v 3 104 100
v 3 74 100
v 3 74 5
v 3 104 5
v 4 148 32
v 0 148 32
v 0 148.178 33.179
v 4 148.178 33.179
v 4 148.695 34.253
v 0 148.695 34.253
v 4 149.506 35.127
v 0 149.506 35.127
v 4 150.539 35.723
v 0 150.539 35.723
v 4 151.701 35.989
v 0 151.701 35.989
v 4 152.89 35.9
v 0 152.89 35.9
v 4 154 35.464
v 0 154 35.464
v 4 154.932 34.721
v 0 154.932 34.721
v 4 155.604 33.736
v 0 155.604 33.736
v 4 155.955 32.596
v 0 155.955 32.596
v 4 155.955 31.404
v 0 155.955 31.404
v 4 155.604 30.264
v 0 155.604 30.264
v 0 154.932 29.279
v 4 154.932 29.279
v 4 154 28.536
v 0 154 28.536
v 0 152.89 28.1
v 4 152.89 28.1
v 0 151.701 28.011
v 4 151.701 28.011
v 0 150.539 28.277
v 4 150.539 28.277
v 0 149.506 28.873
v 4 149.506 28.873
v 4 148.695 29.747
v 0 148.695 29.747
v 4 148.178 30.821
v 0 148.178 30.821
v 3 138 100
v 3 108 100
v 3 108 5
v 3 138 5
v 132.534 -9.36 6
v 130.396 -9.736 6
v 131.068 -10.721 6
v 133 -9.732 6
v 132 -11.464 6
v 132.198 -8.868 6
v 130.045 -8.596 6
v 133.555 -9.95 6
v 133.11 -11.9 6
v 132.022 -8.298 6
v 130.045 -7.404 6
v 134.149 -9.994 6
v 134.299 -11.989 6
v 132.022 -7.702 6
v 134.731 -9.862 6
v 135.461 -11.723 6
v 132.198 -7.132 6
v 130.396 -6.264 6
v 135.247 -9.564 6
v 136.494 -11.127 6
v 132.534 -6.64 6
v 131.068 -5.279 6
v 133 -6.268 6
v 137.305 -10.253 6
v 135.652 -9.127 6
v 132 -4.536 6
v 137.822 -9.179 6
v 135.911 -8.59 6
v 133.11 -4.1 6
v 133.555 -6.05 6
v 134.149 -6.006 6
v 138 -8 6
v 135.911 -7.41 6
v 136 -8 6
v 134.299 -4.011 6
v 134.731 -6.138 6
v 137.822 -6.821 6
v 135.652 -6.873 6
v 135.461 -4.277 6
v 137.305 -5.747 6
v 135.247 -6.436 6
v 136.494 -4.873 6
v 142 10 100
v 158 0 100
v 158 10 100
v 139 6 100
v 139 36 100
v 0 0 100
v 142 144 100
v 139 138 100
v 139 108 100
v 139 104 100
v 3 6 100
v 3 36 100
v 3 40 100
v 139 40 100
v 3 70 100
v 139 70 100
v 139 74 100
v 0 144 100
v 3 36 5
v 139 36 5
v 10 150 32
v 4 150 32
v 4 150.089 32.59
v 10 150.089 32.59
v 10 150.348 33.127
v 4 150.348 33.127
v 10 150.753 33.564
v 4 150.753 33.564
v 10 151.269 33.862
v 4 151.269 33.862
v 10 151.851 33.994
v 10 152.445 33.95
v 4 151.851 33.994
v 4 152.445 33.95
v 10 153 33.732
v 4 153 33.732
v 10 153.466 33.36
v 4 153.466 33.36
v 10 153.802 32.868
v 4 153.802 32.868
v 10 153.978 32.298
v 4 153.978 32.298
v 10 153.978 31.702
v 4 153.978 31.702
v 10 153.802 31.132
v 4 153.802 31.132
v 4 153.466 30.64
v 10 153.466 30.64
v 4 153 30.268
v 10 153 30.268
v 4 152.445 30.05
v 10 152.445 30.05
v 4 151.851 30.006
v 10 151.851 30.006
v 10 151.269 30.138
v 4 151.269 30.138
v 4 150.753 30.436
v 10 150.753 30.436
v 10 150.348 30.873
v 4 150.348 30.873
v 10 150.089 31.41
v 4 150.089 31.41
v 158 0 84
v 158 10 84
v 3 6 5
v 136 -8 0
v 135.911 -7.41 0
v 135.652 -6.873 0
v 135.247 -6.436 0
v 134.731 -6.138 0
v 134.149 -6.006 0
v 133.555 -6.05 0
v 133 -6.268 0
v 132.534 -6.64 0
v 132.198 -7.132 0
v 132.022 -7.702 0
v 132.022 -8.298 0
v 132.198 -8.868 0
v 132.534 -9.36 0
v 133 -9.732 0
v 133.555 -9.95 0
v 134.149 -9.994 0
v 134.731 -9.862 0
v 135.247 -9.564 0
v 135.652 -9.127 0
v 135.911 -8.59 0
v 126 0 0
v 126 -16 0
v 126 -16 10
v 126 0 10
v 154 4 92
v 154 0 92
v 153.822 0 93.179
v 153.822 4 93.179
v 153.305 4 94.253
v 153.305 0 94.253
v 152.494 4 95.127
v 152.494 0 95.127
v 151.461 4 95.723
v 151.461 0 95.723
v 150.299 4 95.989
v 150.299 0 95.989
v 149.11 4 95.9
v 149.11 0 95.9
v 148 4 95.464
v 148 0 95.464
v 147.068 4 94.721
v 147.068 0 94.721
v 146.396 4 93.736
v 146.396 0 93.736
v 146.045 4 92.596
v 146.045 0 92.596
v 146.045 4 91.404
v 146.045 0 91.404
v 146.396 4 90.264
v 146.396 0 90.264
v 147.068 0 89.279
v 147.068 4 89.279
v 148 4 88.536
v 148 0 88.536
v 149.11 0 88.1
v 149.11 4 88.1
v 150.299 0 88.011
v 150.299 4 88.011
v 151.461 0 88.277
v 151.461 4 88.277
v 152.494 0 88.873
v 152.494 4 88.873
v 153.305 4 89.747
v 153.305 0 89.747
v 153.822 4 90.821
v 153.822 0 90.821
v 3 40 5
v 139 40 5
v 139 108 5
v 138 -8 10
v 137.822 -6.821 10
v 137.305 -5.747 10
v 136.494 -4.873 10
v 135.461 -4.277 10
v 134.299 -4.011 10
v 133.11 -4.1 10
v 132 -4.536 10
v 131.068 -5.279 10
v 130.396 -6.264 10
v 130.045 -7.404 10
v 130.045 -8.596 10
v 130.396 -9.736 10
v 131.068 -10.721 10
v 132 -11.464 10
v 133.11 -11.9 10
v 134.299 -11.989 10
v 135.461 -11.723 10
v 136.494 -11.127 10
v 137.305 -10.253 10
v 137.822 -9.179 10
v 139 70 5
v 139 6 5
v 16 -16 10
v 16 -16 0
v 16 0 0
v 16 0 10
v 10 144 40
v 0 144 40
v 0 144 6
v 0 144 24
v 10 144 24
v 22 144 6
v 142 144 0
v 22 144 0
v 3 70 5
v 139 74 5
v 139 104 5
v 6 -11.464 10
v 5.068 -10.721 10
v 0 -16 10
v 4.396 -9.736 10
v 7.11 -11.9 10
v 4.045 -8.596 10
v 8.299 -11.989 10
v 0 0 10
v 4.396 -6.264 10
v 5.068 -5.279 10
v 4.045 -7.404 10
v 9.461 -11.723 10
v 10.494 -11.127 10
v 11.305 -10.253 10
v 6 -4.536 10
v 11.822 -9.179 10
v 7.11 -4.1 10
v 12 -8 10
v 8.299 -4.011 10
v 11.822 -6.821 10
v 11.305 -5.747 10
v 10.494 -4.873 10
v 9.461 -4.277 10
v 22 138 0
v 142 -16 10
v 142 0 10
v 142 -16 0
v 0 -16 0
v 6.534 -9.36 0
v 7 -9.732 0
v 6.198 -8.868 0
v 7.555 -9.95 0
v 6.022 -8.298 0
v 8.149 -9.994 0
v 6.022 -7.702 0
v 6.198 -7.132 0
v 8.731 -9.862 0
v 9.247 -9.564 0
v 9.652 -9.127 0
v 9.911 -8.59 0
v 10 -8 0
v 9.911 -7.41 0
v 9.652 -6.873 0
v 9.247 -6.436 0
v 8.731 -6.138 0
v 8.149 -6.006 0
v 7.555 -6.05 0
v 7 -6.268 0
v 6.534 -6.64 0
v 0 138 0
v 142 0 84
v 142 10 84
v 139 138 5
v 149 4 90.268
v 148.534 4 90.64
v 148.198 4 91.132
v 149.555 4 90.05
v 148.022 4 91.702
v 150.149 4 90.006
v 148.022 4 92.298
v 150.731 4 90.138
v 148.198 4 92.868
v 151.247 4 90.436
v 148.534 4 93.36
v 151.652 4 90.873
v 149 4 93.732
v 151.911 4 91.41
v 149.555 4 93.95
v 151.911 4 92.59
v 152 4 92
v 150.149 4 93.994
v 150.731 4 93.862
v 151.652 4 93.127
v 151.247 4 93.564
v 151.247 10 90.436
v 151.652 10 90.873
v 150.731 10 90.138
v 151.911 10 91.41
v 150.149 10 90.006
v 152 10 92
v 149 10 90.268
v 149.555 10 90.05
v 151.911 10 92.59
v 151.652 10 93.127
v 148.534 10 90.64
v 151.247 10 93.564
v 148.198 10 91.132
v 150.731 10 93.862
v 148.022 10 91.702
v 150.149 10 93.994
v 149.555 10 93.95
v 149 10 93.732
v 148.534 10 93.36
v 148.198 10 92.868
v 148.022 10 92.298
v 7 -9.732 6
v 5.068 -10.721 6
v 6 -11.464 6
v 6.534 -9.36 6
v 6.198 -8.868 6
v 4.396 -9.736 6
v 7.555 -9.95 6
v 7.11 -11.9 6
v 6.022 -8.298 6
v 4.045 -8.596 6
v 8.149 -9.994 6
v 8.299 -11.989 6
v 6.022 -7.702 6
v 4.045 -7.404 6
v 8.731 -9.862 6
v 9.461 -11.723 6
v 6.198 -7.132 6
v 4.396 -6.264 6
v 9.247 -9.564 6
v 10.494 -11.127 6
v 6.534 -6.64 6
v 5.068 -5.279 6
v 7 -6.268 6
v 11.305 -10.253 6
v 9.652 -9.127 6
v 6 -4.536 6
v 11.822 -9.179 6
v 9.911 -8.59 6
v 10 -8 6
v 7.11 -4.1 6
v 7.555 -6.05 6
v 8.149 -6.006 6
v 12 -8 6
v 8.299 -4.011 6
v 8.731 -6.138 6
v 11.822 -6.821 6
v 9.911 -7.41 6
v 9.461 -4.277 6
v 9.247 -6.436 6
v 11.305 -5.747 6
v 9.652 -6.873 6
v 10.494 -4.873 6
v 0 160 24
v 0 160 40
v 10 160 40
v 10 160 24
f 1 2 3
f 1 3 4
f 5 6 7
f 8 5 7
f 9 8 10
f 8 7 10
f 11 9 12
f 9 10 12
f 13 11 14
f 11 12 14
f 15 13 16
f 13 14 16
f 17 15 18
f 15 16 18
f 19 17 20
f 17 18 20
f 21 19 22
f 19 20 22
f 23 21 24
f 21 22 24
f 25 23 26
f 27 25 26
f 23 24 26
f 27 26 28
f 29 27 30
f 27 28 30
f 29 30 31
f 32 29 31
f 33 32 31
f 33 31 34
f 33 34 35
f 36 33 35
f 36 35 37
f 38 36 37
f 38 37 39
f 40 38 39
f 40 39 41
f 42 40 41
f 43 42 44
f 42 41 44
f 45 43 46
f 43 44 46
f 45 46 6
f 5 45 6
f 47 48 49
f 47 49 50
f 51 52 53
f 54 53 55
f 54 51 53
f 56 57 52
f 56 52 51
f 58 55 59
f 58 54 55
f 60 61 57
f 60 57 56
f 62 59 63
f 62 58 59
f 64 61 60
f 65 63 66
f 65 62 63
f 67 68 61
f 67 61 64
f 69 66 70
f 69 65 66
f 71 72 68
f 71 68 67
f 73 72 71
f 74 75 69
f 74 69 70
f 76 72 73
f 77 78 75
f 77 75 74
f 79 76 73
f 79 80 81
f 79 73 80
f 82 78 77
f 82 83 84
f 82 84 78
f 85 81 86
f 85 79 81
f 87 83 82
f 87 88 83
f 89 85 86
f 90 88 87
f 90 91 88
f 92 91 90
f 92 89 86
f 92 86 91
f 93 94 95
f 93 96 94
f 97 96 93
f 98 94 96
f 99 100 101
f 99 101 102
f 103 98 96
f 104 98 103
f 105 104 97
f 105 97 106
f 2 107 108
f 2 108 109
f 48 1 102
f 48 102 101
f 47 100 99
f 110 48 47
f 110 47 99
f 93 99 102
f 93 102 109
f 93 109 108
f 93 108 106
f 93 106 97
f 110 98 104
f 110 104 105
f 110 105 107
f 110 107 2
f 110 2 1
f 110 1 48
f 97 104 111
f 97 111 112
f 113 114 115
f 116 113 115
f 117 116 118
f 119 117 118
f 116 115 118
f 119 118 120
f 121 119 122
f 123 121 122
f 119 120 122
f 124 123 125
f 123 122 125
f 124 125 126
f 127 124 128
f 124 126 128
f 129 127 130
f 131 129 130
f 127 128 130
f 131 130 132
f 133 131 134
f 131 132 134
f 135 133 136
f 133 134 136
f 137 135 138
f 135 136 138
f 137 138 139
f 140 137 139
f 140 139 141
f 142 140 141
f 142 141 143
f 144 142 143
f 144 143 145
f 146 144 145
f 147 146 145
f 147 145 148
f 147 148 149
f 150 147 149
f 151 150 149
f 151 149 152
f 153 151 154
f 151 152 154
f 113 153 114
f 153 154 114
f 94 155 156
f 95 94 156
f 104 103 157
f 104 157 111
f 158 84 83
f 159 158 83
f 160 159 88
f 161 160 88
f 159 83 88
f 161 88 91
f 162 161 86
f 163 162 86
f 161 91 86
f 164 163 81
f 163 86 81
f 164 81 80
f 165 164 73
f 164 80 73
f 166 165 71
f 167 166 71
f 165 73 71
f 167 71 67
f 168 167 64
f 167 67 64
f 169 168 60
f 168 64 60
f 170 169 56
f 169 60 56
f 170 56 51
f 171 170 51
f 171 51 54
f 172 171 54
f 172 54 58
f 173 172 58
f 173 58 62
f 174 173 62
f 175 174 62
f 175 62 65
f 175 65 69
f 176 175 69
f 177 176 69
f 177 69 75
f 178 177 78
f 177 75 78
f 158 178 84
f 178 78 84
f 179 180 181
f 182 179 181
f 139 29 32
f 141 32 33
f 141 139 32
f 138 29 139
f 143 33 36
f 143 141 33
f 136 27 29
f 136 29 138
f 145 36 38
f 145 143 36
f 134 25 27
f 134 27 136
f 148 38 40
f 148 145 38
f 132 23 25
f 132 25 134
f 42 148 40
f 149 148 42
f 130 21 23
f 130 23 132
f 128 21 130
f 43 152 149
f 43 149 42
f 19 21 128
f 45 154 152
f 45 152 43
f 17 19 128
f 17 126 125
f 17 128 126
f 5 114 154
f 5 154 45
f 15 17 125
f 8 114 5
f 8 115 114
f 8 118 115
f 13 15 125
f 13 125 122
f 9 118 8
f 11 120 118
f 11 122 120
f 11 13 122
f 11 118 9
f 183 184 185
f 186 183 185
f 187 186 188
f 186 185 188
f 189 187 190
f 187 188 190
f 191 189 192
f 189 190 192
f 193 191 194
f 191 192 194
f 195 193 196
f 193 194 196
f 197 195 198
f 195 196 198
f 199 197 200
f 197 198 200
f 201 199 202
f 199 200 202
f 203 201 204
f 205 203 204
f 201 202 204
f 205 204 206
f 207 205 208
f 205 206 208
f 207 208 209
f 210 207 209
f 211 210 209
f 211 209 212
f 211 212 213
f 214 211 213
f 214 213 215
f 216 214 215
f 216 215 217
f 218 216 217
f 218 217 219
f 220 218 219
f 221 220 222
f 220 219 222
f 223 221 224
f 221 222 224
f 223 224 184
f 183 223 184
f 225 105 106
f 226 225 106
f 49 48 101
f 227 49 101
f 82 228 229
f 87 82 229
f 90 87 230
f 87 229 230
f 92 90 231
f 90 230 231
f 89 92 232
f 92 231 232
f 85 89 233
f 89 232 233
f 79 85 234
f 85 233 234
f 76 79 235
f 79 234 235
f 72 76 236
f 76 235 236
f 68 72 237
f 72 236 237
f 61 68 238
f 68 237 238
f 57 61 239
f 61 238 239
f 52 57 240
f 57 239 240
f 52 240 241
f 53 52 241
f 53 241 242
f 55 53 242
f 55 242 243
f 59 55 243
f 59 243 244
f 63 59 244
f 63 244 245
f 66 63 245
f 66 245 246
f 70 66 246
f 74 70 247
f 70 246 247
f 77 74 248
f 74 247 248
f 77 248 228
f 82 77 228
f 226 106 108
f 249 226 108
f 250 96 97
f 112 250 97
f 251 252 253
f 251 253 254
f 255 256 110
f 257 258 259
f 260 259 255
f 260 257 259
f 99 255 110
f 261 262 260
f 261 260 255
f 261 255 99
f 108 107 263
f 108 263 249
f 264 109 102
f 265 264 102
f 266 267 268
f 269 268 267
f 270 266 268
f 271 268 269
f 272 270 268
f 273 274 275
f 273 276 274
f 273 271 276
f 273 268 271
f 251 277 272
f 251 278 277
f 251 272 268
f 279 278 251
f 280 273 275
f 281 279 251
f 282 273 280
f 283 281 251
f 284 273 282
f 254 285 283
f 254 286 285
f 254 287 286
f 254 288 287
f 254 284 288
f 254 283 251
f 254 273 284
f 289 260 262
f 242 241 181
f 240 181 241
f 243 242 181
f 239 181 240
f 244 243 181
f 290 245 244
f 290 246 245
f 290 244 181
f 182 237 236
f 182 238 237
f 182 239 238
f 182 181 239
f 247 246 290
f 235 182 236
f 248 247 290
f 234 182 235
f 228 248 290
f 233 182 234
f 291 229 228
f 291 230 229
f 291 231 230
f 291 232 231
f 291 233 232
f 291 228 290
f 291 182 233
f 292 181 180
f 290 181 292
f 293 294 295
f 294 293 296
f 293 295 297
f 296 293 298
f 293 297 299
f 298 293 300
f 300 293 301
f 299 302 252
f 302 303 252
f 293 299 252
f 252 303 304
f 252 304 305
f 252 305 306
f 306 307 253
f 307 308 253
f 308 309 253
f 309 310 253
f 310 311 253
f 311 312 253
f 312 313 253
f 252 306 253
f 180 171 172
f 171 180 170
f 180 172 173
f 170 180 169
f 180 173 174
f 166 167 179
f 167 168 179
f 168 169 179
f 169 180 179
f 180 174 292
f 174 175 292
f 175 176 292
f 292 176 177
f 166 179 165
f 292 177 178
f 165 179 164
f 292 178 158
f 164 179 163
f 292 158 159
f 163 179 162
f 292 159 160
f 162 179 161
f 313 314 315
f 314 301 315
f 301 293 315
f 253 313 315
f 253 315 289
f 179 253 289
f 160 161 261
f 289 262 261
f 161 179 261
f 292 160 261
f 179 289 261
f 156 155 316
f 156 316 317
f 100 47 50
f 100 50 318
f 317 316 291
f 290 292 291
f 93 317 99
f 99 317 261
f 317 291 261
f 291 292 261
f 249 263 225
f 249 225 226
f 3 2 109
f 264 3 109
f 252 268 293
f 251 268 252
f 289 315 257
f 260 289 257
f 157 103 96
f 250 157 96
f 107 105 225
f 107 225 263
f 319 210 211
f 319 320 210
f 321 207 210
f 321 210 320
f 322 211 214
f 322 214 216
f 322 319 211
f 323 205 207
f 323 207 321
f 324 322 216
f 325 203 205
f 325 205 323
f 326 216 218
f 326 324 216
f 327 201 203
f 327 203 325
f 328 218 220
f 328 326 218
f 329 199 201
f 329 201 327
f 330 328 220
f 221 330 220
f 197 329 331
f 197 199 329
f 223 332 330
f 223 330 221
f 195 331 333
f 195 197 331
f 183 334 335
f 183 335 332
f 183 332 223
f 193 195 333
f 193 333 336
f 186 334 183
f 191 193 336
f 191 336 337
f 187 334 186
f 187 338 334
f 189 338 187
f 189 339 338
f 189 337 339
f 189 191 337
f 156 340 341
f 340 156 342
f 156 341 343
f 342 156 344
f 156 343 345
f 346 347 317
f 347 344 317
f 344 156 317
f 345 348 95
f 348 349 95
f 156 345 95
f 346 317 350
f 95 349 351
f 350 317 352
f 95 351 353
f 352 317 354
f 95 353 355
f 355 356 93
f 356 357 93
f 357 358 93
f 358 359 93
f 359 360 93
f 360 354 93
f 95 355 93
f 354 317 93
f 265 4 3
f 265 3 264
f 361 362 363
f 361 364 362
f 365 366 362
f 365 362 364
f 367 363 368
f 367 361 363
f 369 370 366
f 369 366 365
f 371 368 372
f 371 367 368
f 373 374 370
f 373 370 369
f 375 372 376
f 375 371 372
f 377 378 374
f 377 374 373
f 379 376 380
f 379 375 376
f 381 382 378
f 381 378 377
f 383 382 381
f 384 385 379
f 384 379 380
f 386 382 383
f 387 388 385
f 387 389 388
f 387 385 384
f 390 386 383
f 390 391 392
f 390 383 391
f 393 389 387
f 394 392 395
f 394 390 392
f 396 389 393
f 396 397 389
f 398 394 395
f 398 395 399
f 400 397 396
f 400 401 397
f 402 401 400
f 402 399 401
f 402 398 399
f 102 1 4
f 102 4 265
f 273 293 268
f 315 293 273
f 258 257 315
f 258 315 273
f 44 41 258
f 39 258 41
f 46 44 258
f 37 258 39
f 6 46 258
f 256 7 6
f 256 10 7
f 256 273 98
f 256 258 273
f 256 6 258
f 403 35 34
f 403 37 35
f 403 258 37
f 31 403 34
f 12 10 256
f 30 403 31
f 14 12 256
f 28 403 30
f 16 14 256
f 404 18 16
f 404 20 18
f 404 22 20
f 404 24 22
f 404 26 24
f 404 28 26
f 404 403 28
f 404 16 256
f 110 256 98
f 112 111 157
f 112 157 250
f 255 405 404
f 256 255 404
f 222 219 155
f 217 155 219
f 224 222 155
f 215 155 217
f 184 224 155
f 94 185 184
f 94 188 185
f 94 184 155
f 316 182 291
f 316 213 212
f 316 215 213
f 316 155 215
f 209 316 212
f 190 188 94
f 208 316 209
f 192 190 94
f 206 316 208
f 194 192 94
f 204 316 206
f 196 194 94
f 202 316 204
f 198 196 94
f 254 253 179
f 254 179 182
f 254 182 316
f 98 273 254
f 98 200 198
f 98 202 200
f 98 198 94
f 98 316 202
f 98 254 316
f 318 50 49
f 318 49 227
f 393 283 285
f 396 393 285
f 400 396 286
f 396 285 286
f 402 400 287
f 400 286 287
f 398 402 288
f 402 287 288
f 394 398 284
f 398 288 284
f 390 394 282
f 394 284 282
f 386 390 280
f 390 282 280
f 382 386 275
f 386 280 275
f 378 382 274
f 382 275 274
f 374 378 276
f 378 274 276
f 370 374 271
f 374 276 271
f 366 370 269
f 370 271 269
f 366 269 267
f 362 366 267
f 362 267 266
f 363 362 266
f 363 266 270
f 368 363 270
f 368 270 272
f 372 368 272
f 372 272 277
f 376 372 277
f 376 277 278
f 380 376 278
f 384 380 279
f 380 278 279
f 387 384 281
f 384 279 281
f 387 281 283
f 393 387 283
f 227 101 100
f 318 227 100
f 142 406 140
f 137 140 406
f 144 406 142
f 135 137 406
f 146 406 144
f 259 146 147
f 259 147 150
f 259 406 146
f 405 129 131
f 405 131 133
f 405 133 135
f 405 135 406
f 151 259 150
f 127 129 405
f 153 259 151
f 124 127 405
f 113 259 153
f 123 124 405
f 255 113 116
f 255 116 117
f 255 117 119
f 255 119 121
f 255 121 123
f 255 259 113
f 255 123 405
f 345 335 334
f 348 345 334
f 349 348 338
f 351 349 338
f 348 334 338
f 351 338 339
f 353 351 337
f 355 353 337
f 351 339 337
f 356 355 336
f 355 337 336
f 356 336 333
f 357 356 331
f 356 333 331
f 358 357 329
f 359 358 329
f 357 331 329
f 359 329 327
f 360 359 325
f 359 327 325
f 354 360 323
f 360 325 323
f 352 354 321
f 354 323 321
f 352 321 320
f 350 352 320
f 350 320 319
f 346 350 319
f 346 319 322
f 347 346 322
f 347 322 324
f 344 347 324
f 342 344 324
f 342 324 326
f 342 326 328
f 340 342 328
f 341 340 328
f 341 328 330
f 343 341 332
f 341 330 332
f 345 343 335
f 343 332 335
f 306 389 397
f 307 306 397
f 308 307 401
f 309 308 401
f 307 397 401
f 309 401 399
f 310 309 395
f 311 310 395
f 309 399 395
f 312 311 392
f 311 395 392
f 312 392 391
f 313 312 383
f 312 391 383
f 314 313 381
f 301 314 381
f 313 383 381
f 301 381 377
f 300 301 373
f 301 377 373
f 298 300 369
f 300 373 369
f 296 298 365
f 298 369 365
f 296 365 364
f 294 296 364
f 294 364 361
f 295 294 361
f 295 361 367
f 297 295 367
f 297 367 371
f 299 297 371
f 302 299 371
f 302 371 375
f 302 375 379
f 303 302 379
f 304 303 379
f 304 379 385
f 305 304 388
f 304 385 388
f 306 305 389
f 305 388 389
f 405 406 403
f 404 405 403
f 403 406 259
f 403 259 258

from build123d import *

# Parameters (mm, degrees)
SKETCH_W        = 142
SKETCH_H        = 144
PAD_DEPTH       = 100
SKETCH001_W     = 136
SKETCH001_H     = 30
POCKET_DEPTH    = 95
SKETCH002_W     = 10
SKETCH002_H     = 16
PAD001_DEPTH    = 16
SKETCH003_R     = 4
POCKET001_DEPTH = 4
SKETCH004_R     = 2
POCKET002_DEPTH = 6
SKETCH005_W     = 16
SKETCH005_H     = 10
PAD002_DEPTH    = 16
SKETCH006_R     = 4
POCKET003_DEPTH = 4
SKETCH007_R     = 2
POCKET004_DEPTH = 6
POCKET005_DEPTH = 22
SKETCH009_W     = 10
SKETCH009_H     = 16
PAD003_DEPTH    = 16
SKETCH010_R     = 4
POCKET006_DEPTH = 4
SKETCH011_R     = 2
POCKET007_DEPTH = 6


with BuildPart() as part:
    # Sketch → Pad (new body)
    with BuildSketch(Plane.XY):
        with Locations((71, 72)):
            Rectangle(SKETCH_W, SKETCH_H)
    extrude(amount=PAD_DEPTH)

    # Sketch001 (on Face6 of Pad) → Pocket (cut)
    with BuildSketch(Plane.XY.offset(100)):
        with Locations((71, 123)):
            Rectangle(SKETCH001_W, SKETCH001_H)
        with Locations((71, 89)):
            Rectangle(SKETCH001_W, SKETCH001_H)
        with Locations((71, 55)):
            Rectangle(SKETCH001_W, SKETCH001_H)
        with Locations((71, 21)):
            Rectangle(SKETCH001_W, SKETCH001_H)
    extrude(amount=-POCKET_DEPTH, mode=Mode.SUBTRACT)

    # Sketch002 (on Face1 of Pocket) → Pad001 (join)
    with BuildSketch(Plane(origin=(0, 144, 0), x_dir=(-1, 0, 0), z_dir=(0, 1, 0))):
        with Locations((-5, 32)):
            Rectangle(SKETCH002_W, SKETCH002_H)
    extrude(amount=PAD001_DEPTH)

    # Sketch003 (on Face10 of Pad001) → Pocket001 (cut)
    with BuildSketch(Plane(origin=(0, 0, 0), x_dir=(0, -1, 0), z_dir=(-1, 0, 0))):
        with Locations((-152, 32)):
            Circle(SKETCH003_R)
    extrude(amount=-POCKET001_DEPTH, mode=Mode.SUBTRACT)

    # Sketch004 (on Face33 of Pocket001) → Pocket002 (cut)
    with BuildSketch(Plane(origin=(4, 0, 0), x_dir=(0, -1, 0), z_dir=(-1, 0, 0))):
        with Locations((-152, 32)):
            Circle(SKETCH004_R)
    extrude(amount=-POCKET002_DEPTH, mode=Mode.SUBTRACT)

    # Sketch005 (on Face4 of Pocket002) → Pad002 (join)
    with BuildSketch(Plane.XZ):
        with Locations((8, 5)):
            Rectangle(SKETCH005_W, SKETCH005_H)
        with Locations((134, 5)):
            Rectangle(SKETCH005_W, SKETCH005_H)
    extrude(amount=PAD002_DEPTH)

    # Sketch006 (on Face38 of Pad002) → Pocket003 (cut)
    with BuildSketch(Plane.XY.offset(10)):
        with Locations((8, -8)):
            Circle(SKETCH006_R)
        with Locations((134, -8)):
            Circle(SKETCH006_R)
    extrude(amount=-POCKET003_DEPTH, mode=Mode.SUBTRACT)

    # Sketch007 (on Face48 of Pocket003) → Pocket004 (cut)
    with BuildSketch(Plane.XY.offset(6)):
        with Locations((8, -8)):
            Circle(SKETCH007_R)
        with Locations((134, -8)):
            Circle(SKETCH007_R)
    extrude(amount=-POCKET004_DEPTH, mode=Mode.SUBTRACT)

    # Sketch008 (on Face5 of Pocket004) → Pocket005 (cut)
    with BuildSketch(Plane(origin=(0, 0, 0), x_dir=(0, -1, 0), z_dir=(-1, 0, 0))):
        Polygon((-144, 6), (-144, 0), (-138, 0), align=None)
    extrude(amount=-POCKET005_DEPTH, mode=Mode.SUBTRACT)

    # Sketch009 (on Face3 of Pocket005) → Pad003 (join)
    with BuildSketch(Plane.YZ.offset(142)):
        with Locations((5, 92)):
            Rectangle(SKETCH009_W, SKETCH009_H)
    extrude(amount=PAD003_DEPTH)

    # Sketch010 (on Face42 of Pad003) → Pocket006 (cut)
    with BuildSketch(Plane.XZ):
        with Locations((150, 92)):
            Circle(SKETCH010_R)
    extrude(amount=-POCKET006_DEPTH, mode=Mode.SUBTRACT)

    # Sketch011 (on Face59 of Pocket006) → Pocket007 (cut)
    with BuildSketch(Plane.XZ.offset(-4)):
        with Locations((150, 92)):
            Circle(SKETCH011_R)
    extrude(amount=-POCKET007_DEPTH, mode=Mode.SUBTRACT)


solid = part.part
